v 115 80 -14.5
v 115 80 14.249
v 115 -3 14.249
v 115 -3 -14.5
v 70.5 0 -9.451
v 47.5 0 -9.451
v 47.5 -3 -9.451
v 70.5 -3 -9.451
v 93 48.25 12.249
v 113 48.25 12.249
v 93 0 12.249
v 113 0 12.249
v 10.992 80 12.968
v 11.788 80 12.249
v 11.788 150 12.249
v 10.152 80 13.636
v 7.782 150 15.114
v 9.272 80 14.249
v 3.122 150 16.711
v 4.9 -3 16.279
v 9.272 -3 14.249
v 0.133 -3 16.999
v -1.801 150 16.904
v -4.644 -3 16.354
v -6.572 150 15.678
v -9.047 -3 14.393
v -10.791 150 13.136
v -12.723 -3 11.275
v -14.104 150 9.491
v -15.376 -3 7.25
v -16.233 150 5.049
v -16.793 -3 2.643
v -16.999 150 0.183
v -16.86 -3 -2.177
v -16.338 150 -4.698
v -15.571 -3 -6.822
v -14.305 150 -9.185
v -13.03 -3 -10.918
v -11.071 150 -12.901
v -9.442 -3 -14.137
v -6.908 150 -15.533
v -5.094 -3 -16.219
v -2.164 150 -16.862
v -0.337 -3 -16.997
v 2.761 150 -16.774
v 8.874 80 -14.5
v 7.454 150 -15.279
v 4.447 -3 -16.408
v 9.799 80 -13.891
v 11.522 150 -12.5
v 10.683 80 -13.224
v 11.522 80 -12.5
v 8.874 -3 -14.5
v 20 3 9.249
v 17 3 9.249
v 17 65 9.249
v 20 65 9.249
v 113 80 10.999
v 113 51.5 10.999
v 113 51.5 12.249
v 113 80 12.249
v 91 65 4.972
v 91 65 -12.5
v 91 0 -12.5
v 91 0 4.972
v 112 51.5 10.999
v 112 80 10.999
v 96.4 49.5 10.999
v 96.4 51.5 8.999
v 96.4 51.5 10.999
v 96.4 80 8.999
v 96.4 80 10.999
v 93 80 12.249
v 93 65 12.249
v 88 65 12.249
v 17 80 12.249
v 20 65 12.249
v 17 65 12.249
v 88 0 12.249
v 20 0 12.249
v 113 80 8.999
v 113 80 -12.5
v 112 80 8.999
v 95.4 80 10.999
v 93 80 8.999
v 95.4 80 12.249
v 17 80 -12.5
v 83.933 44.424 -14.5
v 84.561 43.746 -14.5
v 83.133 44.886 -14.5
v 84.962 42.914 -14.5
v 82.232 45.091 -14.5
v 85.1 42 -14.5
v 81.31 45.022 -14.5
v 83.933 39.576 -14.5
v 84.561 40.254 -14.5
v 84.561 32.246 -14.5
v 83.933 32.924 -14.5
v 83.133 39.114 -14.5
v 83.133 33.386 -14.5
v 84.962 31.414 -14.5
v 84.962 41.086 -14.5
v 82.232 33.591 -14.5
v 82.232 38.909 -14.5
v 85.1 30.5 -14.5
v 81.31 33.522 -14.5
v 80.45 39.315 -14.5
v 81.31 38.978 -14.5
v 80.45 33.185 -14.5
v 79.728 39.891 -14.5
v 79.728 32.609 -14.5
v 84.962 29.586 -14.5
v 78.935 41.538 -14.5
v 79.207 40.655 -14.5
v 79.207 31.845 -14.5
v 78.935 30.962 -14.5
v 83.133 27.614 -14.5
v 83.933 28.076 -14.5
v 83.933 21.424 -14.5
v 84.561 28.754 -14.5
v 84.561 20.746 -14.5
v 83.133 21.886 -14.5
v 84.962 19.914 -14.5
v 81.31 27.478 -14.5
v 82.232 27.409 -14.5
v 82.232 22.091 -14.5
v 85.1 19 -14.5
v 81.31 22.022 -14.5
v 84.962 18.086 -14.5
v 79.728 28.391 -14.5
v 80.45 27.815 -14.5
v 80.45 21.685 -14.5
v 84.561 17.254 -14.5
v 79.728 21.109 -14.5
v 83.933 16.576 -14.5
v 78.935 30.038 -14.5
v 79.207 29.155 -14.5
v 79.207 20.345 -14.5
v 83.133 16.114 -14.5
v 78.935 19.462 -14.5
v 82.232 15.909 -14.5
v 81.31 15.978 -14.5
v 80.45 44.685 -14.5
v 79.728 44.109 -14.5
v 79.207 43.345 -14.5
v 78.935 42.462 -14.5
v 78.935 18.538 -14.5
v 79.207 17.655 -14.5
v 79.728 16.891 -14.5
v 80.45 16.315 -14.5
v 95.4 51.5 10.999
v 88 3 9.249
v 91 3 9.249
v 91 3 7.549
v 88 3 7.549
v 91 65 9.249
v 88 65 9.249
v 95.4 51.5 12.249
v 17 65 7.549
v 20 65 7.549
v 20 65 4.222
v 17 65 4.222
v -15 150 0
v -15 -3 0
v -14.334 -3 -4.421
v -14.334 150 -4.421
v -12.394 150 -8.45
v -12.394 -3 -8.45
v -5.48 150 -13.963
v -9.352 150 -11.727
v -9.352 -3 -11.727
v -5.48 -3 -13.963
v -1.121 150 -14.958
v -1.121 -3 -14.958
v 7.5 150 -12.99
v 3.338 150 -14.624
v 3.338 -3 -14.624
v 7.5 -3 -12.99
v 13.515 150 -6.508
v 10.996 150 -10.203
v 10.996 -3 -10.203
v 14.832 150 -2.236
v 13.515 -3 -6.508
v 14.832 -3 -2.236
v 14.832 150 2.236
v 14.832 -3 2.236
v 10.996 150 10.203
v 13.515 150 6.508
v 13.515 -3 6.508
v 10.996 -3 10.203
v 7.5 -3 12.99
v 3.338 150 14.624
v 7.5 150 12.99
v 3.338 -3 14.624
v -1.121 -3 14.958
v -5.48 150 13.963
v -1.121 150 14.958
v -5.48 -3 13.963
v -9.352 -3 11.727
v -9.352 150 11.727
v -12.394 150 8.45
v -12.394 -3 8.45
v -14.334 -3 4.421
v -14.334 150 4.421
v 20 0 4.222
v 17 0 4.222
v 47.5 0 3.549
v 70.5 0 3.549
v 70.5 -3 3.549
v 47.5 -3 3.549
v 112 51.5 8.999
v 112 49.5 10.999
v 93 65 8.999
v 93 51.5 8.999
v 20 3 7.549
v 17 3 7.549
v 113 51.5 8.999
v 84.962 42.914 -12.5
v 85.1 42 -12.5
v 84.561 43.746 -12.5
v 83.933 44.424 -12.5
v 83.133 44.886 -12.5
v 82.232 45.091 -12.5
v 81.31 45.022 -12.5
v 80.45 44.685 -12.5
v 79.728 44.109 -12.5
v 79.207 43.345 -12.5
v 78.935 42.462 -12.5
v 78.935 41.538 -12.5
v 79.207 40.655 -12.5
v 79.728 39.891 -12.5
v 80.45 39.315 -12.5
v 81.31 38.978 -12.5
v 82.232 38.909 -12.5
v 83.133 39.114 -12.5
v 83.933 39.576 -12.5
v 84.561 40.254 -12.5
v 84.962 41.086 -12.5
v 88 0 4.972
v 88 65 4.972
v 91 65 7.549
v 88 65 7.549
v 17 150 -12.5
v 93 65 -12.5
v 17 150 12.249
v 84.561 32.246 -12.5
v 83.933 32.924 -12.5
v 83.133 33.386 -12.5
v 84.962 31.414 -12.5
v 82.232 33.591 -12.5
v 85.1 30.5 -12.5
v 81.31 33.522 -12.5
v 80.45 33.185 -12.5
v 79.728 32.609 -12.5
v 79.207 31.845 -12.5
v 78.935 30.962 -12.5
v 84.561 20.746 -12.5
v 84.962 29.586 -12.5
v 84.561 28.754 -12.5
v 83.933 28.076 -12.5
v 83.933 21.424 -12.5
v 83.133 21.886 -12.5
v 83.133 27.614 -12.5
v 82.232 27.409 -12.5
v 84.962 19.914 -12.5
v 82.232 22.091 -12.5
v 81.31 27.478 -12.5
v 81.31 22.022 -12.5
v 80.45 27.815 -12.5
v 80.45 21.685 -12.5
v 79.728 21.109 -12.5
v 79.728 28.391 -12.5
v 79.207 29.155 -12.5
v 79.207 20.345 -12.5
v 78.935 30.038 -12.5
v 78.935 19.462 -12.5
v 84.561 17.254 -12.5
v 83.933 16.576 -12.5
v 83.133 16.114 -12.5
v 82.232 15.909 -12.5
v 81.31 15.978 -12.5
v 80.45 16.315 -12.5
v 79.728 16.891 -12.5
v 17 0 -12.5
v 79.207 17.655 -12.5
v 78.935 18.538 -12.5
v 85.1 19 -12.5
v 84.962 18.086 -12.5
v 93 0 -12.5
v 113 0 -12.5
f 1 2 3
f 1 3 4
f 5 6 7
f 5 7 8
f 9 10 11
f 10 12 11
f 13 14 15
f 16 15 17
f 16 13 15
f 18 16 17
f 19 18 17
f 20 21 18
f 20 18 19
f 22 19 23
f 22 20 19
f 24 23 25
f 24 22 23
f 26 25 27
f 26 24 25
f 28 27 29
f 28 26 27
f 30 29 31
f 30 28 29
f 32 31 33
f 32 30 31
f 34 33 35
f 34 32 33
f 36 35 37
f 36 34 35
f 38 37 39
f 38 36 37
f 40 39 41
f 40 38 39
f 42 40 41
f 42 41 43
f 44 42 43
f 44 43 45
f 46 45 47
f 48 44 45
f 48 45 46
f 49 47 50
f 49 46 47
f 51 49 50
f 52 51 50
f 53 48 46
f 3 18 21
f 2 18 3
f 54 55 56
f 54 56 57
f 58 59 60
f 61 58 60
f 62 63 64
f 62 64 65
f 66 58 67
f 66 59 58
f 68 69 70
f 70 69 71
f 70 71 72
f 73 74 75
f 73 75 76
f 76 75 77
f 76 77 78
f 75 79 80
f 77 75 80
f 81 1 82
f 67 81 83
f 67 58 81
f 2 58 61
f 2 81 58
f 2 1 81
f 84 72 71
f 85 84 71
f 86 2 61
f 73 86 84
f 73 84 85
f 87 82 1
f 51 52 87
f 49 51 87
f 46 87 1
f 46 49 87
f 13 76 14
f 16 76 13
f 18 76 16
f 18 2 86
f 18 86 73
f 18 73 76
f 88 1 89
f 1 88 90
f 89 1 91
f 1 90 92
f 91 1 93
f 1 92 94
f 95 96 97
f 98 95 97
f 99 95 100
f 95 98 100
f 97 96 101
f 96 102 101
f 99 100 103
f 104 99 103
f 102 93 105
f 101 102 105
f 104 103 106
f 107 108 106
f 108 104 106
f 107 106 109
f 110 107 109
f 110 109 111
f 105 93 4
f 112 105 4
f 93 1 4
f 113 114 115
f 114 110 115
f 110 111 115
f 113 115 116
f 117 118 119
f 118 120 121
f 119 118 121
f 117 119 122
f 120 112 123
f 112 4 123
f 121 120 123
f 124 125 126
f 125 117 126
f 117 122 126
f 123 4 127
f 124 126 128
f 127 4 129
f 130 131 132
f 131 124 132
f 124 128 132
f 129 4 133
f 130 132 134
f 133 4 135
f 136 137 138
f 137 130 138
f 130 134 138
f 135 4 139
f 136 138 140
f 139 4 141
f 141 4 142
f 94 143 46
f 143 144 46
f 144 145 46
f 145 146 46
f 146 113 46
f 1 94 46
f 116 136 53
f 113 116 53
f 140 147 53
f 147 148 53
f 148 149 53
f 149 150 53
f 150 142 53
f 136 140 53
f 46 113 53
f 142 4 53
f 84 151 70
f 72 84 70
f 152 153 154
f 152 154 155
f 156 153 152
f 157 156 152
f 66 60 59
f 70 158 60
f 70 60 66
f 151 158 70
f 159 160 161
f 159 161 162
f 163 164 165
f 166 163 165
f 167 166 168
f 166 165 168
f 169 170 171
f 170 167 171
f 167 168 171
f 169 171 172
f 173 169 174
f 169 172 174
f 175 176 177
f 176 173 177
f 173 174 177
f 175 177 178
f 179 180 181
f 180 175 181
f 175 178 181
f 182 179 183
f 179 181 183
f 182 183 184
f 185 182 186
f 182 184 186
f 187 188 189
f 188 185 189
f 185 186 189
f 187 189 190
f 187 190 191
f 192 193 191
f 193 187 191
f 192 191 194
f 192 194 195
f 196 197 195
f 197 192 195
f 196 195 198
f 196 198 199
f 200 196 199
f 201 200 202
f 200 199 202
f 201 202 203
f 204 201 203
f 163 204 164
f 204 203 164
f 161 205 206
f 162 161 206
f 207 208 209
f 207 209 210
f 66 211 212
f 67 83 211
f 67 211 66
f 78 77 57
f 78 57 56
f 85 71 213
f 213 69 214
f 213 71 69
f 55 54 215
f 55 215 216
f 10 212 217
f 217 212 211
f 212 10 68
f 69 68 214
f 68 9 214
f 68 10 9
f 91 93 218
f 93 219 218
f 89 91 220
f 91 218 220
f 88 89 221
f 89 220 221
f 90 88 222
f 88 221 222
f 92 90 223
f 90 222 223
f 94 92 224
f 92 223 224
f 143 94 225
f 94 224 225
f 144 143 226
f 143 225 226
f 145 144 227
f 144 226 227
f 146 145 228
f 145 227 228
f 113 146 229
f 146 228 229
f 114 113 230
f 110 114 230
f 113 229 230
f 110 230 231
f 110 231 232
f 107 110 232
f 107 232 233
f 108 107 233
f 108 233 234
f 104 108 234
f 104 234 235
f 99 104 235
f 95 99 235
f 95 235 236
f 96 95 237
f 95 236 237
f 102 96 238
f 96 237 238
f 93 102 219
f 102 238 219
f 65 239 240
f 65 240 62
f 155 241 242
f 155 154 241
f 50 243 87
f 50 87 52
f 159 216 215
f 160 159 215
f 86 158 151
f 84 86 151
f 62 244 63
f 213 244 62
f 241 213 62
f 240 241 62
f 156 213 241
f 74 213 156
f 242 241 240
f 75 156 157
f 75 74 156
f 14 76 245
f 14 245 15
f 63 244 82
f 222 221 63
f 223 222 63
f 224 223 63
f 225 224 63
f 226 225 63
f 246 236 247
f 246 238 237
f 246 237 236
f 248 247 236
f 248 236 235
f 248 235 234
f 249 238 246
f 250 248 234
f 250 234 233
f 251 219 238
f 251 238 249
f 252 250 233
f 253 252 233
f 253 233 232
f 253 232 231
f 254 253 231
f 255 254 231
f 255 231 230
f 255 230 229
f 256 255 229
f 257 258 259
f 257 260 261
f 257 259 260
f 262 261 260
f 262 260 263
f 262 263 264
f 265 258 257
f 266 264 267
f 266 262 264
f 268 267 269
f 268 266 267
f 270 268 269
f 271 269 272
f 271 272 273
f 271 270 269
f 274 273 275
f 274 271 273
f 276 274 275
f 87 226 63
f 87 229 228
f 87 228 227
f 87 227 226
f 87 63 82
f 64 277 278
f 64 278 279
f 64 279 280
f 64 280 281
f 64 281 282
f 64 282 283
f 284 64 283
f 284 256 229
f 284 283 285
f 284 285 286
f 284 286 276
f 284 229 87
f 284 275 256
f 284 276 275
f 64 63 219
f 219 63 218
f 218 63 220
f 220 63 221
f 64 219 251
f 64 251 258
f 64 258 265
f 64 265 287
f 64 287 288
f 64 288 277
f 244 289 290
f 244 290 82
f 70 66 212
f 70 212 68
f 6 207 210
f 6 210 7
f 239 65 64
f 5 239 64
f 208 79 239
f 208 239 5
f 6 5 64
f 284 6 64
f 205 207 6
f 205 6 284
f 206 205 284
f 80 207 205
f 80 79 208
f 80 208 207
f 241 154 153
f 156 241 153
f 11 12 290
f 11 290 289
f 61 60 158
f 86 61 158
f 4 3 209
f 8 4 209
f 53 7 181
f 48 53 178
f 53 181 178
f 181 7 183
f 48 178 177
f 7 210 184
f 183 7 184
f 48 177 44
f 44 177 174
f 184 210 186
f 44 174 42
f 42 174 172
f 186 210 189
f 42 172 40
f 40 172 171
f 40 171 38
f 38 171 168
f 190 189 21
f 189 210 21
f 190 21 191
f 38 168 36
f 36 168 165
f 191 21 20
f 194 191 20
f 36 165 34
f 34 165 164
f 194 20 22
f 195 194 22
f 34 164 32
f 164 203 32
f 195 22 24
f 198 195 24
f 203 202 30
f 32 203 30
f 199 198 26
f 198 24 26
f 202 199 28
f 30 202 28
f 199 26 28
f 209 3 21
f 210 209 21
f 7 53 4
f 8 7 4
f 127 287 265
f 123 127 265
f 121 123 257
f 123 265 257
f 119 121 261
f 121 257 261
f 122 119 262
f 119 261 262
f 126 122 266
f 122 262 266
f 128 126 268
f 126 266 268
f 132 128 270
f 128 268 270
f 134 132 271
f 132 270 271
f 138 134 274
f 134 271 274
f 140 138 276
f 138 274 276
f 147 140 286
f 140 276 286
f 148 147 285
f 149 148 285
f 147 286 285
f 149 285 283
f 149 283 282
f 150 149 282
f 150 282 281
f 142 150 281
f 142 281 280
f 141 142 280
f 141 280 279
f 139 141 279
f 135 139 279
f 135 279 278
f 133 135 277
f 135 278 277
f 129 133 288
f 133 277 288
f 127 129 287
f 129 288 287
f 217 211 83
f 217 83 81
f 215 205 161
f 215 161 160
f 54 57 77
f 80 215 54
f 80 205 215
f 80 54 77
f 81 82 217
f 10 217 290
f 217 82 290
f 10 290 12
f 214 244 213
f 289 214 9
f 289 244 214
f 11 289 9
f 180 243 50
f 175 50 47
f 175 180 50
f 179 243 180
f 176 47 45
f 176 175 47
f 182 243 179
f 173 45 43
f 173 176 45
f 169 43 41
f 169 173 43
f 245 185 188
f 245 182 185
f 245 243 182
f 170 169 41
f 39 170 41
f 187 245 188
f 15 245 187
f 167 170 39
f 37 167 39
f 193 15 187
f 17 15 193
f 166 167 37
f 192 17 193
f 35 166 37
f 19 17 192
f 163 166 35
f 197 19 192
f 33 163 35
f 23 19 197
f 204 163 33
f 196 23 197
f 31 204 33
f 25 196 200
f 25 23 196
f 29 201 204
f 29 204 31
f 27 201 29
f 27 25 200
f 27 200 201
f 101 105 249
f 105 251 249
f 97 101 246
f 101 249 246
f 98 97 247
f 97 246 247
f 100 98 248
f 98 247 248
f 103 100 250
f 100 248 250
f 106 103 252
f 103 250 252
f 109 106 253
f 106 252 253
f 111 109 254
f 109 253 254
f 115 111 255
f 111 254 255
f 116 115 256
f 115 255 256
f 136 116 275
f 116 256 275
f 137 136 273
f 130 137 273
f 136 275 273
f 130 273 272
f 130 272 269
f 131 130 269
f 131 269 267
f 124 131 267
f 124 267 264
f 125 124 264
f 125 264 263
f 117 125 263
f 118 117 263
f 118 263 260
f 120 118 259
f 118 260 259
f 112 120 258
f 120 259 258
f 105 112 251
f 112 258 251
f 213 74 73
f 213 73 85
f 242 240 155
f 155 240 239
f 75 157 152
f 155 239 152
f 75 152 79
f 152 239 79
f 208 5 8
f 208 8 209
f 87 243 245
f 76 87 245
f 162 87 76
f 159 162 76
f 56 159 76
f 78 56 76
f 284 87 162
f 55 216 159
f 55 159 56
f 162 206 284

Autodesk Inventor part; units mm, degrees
ref_plane "YZ Plane" through (0, 0, 0) normal (1, 0, 0) x (0, 1, 0)
ref_plane "XZ Plane" through (0, 0, 0) normal (0, 1, 0) x (-1, 0, 0)
ref_plane "XY Plane" through (0, 0, 0) normal (0, 0, 1) x (1, 0, 0)
sketch "Sketch1" plane through (0, 0, 0) normal (0, 1, 0) x (-1, 0, 0)
  circle A0 centre (0, 0) radius 15
  line L0 (-17, 0) -> (-91, 0)
  line L1 (-91, 0) -> (-115, 0)
  line L2 (-115, 0) -> (-115, -14.5)
  line L3 (-115, -14.5) -> (-8.8741, -14.5)
  line L4 (-0.35, 0) -> (-0.35, 13.2189)
  line L5 (-9.2718, 14.249) -> (-115, 14.249)
  line L6 (-115, 14.249) -> (-115, -14.5)
  line L7 (-113, -12.5) -> (-11.5217, -12.5)
  line L8 (-113, -12.5) -> (-113, 12.249)
  line L9 (-113, 12.249) -> (-11.7882, 12.249)
  circle A1 centre (0, 0) radius 17
  line L10 (-17, 0) -> (-17, 12.249)
  line L11 (-17, 0) -> (-17, -12.5)
  line L12 (-91, -12.5) -> (-91, 12.249)
  line L13 (-93, -12.5) -> (-93, 12.249)
  line L14 (-17, 12.249) -> (-17, 9.249)
  line L15 (-17, 9.249) -> (-20, 9.249)
  line L16 (-20, 9.249) -> (-20, 12.249)
  line L17 (-20, 12.249) -> (-17, 12.249)
  line L18 (-17, 12.249) -> (-17, 9.249)
  line L19 (-91, 9.249) -> (-88, 9.249)
  line L20 (-88, 9.249) -> (-88, 12.249)
  line L21 (-88, 12.249) -> (-91, 12.249)
  line L22 (-91, 12.249) -> (-91, 9.249)
  line L23 (-17, 9.249) -> (-17, 7.549)
  line L24 (-17, 7.549) -> (-20, 7.549)
  line L25 (-20, 7.549) -> (-20, 4.2225)
  line L26 (-20, 4.2225) -> (-17, 4.2225)
  line L27 (-17, 4.2225) -> (-17, 7.549)
  line L28 (-91, 7.549) -> (-88, 7.549)
  line L29 (-88, 7.549) -> (-88, 4.9725)
  line L30 (-88, 4.9725) -> (-91, 4.9725)
  line L31 (-91, 4.9725) -> (-91, 7.549)
  line L32 (-17, 7.549) -> (-20, 7.549)
  line L33 (-20, 7.549) -> (-20, 9.249)
  line L34 (-20, 9.249) -> (-17, 9.249)
  line L35 (-17, 9.249) -> (-17, 7.549)
  line L36 (-91, 7.549) -> (-88, 7.549)
  line L37 (-88, 7.549) -> (-88, 9.249)
  line L38 (-88, 9.249) -> (-91, 9.249)
  line L39 (-91, 9.249) -> (-91, 7.549)
  line L40 (-91, 7.549) -> (-70.5, 7.549)
  line L41 (-70.5, 7.549) -> (-70.5, 3.549)
  line L42 (-70.5, 3.549) -> (-47.5, 3.549)
  line L43 (-47.5, 3.549) -> (-47.5, -9.451)
  line L44 (-47.5, -9.451) -> (-70.5, -9.451)
  line L45 (-70.5, -9.451) -> (-70.5, 3.549)
  point P0 (-93, 12.249)
  dimension "d0" = 30
  dimension "d1" = 74
  dimension "d2" = 24
  dimension "d3" = 14.5
  dimension "d4" = 29
  dimension "d5" = 2
  dimension "d6" = 2
  dimension "d7" = 2
  dimension "d9" = 2
  dimension "d10" = 3
  dimension "d11" = 3
  dimension "d12" = 3
  dimension "d13" = 1.7
  dimension "d14" = 3
  dimension "d15" = 3
  dimension "d16" = 20.5
  dimension "d17" = 4
  dimension "d18" = 23
  dimension "d19" = 13
extrude "Extrusion1" add sketch "Sketch1" against normal blind 3 contours L11 L7 L12 L0 L45 L44 L43 | L10 L9 A1 | A1 | L0 L43 L42 L41 L40 L37 L20 L9 L16 L33 L25 L26 L10 | A1 L7 L11 | L9 L8 L1 L6 L5 A1 | A1 L3 L2 L1 L8 L7 | L26 L25 L24 L10 | L0 L12 L30 L29 L40 L41 L45 | L10 L15 L16 L9 | L24 L33 L15 L10 | L7 L13 L1 L12 | L1 L13 L9 L12 | L7 L8 L1 L13 | L1 L8 L9 L13 | L12 L28 L29 L30 | L20 L19 L12 L9 | L12 L19 L37 L28
extrude "Extrusion2" add sketch "Sketch1" along normal blind 150 contours A1
extrude "Extrusion3" add sketch "Sketch1" along normal blind 150 contours L10 L9 A1 | A1 L7 L11
extrude "Extrusion4" add sketch "Sketch1" along normal blind 80 contours L9 L8 L1 L6 L5 A1 | A1 L3 L2 L1 L8 L7
extrude "Extrusion5" add sketch "Sketch1" along normal blind 3 contours L24 L33 L15 L10 | L12 L19 L37 L28
extrude "Extrusion6" add sketch "Sketch1" along normal blind 65 contours L26 L25 L24 L10 | L10 L15 L16 L9 | L7 L13 L1 L12 | L1 L13 L9 L12 | L12 L28 L29 L30 | L20 L19 L12 L9
sketch "Sketch2" plane through (0, 65, 0) normal (0, 1, 0) x (1, 0, 0)
  line L0 (113, -12.249) -> (113, 12.5) projected
  line L1 (113, -12.249) -> (113, -10.999)
  line L2 (113, -10.999) -> (112, -10.999)
  line L3 (112, -10.999) -> (112, -8.999)
  line L4 (112, -8.999) -> (113, -8.999)
  line L5 (113, -12.249) -> (95.4, -12.249)
  line L6 (113, -12.249) -> (17, -12.249) projected
  line L7 (95.4, -12.249) -> (95.4, -10.999)
  line L8 (95.4, -10.999) -> (96.4, -10.999)
  line L9 (96.4, -10.999) -> (96.4, -8.9987)
  line L10 (96.4, -8.9987) -> (93, -8.9987)
  line L11 (93, -12.249) -> (93, 12.5) projected
  line L12 (93, -8.9987) -> (93, -12.249)
  line L13 (93, -12.249) -> (95.4, -12.249)
  point P0 (0, 0)
  dimension "d32" = 1.25
  dimension "d33" = 1
  dimension "d34" = 2
  dimension "d35" = 17.6
  dimension "d36" = 1
extrude "Extrusion7" add sketch "Sketch2" along normal up to surface (15 mm away)
extrude "Extrusion8" add sketch "Sketch2" against normal blind 13.5
sketch "Sketch3" plane through (93, 0, -12.5) normal (1, 0, 0) x (0, 0, -1)
  line L0 (-23.499, 51.5) -> (-24.749, 51.5) projected
  line L1 (-24.749, 51.5) -> (-21.4987, 51.5)
  line L2 (-24.749, 51.5) -> (-21.4987, 51.5)
  line L3 (-24.749, 51.5) -> (-24.749, 48.25)
  line L4 (-24.749, 48.25) -> (-21.4987, 51.5)
  point P0 (-12.5, 0)
  dimension "d44" = 3.25
extrude "Extrusion9" add sketch "Sketch3" along normal up to surface (20 mm away)
sketch "Sketch4" plane through (95.4, 51.5, 12.249) normal (0, 1, 0) x (1, 0, 0)
  line L0 (1, 3.2503) -> (1, 1.25) projected
  line L1 (17.6, 1.25) -> (16.6, 1.25) projected
  line L2 (1, 3.2503) -> (16.6, 3.2503)
  line L3 (16.6, 3.2503) -> (16.6, 1.25)
  line L4 (16.6, 1.25) -> (1, 1.25)
  line L5 (1, 1.25) -> (1, 3.2503)
  point P0 (-95.4, 12.249)
extrude "Extrusion10" cut sketch "Sketch4" against normal blind 10
sketch "Sketch5" plane through (17, 80, -12.5) normal (0, 0, 1) x (1, 0, 0)
  line L0 (74, -77) -> (71, -77) projected
  line L1 (74, -77) -> (74, -61)
  line L2 (74, -80) -> (74, -15) projected
  line L3 (74, -61) -> (65, -61)
  circle A0 centre (65, -61) radius 3.1
  line L4 (65, -61) -> (65, -49.5)
  line L5 (65, -49.5) -> (65, -38)
  circle A1 centre (65, -49.5) radius 3.1
  circle A2 centre (65, -38) radius 3.1
  circle A3 centre (65, -38) radius 5.1
  circle A4 centre (65, -49.5) radius 5.1
  circle A5 centre (65, -61) radius 5.1
  line L6 (3, -80) -> (71, -80) projected
  line L7 (64, -80) -> (66, -80)
  line L8 (66, -31.3579) -> (64, -31.3579)
  line L9 (64, -43.001) -> (64, -44.499)
  line L10 (66, -44.499) -> (66, -43.001)
  line L11 (66, -55.999) -> (66, -54.501)
  line L12 (64, -54.501) -> (64, -55.999)
  line L13 (64, -66.001) -> (64, -80)
  line L14 (66, -80) -> (66, -66.001)
  point P0 (-17, -80)
  dimension "d47" = 16
  dimension "d48" = 9
  dimension "d49" = 6.2
  dimension "d50" = 11.5
  dimension "d51" = 11.5
  dimension "d52" = 6.2
  dimension "d53" = 6.2
  dimension "d54" = 2
  dimension "d55" = 2
  dimension "d56" = 2
  dimension "d57" = 2
extrude "Extrusion11" cut sketch "Sketch5" against normal blind 10 contours A0 L4 L3 | L3 L4 A0 | A1 L5 L4 | L4 L5 A1 | A2
properties part number "Open_source_chronograph_main_body_v2"
